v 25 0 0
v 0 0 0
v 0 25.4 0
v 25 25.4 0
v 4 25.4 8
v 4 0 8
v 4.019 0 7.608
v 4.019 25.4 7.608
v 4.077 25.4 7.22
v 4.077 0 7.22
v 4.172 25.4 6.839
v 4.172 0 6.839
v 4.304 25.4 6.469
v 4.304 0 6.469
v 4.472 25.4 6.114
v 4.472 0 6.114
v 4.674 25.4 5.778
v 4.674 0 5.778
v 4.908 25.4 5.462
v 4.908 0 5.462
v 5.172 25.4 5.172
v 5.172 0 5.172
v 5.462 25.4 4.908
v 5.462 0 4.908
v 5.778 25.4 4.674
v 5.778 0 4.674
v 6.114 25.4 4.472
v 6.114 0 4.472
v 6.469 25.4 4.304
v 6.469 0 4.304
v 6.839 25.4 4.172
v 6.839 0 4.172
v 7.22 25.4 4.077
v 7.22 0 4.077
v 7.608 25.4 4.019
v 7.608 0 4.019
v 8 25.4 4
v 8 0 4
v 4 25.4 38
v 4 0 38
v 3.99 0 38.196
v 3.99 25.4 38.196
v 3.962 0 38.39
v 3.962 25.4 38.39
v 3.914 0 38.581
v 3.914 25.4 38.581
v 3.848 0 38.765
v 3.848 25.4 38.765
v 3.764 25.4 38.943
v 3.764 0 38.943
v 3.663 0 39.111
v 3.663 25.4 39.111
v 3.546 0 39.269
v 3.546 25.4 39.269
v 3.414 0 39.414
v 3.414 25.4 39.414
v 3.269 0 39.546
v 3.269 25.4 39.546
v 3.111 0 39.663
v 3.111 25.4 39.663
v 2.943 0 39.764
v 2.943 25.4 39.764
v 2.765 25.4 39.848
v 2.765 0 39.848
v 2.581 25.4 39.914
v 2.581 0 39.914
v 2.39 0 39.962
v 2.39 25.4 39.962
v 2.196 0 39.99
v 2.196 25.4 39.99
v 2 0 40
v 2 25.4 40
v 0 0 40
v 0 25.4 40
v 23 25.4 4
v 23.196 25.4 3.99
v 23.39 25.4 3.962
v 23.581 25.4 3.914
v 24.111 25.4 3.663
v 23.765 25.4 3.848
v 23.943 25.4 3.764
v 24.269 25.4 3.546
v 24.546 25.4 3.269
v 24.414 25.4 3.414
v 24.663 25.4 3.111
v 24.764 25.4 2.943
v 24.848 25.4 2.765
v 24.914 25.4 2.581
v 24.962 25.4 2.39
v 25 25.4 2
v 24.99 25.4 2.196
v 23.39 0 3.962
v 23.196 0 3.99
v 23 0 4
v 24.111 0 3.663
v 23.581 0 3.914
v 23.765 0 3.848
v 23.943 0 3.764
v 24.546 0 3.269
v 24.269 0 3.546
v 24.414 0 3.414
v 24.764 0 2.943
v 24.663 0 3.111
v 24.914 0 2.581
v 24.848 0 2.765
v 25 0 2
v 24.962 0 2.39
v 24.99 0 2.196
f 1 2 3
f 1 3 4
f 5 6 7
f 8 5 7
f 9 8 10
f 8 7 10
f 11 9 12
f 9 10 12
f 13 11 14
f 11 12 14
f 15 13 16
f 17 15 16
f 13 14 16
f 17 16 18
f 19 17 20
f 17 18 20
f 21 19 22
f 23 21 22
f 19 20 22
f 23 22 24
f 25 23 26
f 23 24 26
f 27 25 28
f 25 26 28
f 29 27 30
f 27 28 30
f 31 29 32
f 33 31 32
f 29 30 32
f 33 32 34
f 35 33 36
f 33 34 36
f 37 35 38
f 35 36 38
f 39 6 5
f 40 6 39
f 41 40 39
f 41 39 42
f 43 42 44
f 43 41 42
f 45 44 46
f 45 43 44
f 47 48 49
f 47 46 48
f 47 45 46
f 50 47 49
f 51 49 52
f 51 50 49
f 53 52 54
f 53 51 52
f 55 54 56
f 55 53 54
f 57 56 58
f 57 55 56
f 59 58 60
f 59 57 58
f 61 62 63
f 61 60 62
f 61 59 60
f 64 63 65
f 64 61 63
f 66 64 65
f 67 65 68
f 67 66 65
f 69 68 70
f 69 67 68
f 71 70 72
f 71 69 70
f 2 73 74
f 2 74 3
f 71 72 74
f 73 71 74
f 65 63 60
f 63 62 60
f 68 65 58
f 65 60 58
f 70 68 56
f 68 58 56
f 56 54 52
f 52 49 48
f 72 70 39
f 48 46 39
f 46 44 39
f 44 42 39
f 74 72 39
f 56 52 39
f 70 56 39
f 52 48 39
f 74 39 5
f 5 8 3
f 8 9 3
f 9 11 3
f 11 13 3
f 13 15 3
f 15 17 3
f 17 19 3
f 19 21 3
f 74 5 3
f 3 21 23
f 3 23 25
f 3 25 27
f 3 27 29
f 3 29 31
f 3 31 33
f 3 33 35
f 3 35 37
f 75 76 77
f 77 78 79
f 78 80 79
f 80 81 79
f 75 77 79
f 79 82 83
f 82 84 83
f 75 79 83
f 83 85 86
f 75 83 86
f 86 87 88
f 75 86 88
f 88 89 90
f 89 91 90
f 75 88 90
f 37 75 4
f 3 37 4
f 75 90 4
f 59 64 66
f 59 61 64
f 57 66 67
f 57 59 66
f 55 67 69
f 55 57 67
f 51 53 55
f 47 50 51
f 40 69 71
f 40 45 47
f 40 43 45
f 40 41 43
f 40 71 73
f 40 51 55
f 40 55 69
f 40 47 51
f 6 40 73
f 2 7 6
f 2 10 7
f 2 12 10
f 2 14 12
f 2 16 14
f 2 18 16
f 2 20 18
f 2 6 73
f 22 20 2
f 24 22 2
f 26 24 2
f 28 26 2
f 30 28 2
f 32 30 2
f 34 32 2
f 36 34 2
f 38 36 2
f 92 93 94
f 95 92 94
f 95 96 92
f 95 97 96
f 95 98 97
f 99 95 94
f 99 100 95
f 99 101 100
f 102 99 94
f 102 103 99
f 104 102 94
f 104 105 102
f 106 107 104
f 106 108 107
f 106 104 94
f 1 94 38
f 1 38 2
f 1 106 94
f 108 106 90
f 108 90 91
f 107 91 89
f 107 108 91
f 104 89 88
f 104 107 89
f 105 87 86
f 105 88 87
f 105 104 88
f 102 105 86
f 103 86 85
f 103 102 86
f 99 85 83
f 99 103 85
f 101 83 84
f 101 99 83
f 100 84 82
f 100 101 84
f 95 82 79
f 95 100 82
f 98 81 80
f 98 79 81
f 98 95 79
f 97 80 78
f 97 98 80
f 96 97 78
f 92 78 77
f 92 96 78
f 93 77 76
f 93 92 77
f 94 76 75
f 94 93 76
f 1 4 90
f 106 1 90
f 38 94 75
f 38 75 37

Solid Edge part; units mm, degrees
sketch "Sketch1" plane through (0, 0, 0) normal (0, -1, 0) x (1, 0, 0)
  line L0 (25, 0) -> (25, 2)
  arc A0 (23, 4) -> (25, 2) centre (23, 2) cw
  line L1 (23, 4) -> (8, 4)
  arc A1 (4, 8) -> (8, 4) centre (8, 8) ccw
  line L2 (4, 8) -> (4, 38)
  arc A2 (2, 40) -> (4, 38) centre (2, 38) cw
  line L3 (2, 40) -> (0, 40)
  line L4 (0, 40) -> (0, 0)
  line L5 (0, 0) -> (25, 0)
  dimension "D1" = 40
  dimension "D2" = 25
  dimension "D3" = 4
  dimension "D4" = 4
extrude "Protrusion1" add sketch "Sketch1" against normal blind 25.4
